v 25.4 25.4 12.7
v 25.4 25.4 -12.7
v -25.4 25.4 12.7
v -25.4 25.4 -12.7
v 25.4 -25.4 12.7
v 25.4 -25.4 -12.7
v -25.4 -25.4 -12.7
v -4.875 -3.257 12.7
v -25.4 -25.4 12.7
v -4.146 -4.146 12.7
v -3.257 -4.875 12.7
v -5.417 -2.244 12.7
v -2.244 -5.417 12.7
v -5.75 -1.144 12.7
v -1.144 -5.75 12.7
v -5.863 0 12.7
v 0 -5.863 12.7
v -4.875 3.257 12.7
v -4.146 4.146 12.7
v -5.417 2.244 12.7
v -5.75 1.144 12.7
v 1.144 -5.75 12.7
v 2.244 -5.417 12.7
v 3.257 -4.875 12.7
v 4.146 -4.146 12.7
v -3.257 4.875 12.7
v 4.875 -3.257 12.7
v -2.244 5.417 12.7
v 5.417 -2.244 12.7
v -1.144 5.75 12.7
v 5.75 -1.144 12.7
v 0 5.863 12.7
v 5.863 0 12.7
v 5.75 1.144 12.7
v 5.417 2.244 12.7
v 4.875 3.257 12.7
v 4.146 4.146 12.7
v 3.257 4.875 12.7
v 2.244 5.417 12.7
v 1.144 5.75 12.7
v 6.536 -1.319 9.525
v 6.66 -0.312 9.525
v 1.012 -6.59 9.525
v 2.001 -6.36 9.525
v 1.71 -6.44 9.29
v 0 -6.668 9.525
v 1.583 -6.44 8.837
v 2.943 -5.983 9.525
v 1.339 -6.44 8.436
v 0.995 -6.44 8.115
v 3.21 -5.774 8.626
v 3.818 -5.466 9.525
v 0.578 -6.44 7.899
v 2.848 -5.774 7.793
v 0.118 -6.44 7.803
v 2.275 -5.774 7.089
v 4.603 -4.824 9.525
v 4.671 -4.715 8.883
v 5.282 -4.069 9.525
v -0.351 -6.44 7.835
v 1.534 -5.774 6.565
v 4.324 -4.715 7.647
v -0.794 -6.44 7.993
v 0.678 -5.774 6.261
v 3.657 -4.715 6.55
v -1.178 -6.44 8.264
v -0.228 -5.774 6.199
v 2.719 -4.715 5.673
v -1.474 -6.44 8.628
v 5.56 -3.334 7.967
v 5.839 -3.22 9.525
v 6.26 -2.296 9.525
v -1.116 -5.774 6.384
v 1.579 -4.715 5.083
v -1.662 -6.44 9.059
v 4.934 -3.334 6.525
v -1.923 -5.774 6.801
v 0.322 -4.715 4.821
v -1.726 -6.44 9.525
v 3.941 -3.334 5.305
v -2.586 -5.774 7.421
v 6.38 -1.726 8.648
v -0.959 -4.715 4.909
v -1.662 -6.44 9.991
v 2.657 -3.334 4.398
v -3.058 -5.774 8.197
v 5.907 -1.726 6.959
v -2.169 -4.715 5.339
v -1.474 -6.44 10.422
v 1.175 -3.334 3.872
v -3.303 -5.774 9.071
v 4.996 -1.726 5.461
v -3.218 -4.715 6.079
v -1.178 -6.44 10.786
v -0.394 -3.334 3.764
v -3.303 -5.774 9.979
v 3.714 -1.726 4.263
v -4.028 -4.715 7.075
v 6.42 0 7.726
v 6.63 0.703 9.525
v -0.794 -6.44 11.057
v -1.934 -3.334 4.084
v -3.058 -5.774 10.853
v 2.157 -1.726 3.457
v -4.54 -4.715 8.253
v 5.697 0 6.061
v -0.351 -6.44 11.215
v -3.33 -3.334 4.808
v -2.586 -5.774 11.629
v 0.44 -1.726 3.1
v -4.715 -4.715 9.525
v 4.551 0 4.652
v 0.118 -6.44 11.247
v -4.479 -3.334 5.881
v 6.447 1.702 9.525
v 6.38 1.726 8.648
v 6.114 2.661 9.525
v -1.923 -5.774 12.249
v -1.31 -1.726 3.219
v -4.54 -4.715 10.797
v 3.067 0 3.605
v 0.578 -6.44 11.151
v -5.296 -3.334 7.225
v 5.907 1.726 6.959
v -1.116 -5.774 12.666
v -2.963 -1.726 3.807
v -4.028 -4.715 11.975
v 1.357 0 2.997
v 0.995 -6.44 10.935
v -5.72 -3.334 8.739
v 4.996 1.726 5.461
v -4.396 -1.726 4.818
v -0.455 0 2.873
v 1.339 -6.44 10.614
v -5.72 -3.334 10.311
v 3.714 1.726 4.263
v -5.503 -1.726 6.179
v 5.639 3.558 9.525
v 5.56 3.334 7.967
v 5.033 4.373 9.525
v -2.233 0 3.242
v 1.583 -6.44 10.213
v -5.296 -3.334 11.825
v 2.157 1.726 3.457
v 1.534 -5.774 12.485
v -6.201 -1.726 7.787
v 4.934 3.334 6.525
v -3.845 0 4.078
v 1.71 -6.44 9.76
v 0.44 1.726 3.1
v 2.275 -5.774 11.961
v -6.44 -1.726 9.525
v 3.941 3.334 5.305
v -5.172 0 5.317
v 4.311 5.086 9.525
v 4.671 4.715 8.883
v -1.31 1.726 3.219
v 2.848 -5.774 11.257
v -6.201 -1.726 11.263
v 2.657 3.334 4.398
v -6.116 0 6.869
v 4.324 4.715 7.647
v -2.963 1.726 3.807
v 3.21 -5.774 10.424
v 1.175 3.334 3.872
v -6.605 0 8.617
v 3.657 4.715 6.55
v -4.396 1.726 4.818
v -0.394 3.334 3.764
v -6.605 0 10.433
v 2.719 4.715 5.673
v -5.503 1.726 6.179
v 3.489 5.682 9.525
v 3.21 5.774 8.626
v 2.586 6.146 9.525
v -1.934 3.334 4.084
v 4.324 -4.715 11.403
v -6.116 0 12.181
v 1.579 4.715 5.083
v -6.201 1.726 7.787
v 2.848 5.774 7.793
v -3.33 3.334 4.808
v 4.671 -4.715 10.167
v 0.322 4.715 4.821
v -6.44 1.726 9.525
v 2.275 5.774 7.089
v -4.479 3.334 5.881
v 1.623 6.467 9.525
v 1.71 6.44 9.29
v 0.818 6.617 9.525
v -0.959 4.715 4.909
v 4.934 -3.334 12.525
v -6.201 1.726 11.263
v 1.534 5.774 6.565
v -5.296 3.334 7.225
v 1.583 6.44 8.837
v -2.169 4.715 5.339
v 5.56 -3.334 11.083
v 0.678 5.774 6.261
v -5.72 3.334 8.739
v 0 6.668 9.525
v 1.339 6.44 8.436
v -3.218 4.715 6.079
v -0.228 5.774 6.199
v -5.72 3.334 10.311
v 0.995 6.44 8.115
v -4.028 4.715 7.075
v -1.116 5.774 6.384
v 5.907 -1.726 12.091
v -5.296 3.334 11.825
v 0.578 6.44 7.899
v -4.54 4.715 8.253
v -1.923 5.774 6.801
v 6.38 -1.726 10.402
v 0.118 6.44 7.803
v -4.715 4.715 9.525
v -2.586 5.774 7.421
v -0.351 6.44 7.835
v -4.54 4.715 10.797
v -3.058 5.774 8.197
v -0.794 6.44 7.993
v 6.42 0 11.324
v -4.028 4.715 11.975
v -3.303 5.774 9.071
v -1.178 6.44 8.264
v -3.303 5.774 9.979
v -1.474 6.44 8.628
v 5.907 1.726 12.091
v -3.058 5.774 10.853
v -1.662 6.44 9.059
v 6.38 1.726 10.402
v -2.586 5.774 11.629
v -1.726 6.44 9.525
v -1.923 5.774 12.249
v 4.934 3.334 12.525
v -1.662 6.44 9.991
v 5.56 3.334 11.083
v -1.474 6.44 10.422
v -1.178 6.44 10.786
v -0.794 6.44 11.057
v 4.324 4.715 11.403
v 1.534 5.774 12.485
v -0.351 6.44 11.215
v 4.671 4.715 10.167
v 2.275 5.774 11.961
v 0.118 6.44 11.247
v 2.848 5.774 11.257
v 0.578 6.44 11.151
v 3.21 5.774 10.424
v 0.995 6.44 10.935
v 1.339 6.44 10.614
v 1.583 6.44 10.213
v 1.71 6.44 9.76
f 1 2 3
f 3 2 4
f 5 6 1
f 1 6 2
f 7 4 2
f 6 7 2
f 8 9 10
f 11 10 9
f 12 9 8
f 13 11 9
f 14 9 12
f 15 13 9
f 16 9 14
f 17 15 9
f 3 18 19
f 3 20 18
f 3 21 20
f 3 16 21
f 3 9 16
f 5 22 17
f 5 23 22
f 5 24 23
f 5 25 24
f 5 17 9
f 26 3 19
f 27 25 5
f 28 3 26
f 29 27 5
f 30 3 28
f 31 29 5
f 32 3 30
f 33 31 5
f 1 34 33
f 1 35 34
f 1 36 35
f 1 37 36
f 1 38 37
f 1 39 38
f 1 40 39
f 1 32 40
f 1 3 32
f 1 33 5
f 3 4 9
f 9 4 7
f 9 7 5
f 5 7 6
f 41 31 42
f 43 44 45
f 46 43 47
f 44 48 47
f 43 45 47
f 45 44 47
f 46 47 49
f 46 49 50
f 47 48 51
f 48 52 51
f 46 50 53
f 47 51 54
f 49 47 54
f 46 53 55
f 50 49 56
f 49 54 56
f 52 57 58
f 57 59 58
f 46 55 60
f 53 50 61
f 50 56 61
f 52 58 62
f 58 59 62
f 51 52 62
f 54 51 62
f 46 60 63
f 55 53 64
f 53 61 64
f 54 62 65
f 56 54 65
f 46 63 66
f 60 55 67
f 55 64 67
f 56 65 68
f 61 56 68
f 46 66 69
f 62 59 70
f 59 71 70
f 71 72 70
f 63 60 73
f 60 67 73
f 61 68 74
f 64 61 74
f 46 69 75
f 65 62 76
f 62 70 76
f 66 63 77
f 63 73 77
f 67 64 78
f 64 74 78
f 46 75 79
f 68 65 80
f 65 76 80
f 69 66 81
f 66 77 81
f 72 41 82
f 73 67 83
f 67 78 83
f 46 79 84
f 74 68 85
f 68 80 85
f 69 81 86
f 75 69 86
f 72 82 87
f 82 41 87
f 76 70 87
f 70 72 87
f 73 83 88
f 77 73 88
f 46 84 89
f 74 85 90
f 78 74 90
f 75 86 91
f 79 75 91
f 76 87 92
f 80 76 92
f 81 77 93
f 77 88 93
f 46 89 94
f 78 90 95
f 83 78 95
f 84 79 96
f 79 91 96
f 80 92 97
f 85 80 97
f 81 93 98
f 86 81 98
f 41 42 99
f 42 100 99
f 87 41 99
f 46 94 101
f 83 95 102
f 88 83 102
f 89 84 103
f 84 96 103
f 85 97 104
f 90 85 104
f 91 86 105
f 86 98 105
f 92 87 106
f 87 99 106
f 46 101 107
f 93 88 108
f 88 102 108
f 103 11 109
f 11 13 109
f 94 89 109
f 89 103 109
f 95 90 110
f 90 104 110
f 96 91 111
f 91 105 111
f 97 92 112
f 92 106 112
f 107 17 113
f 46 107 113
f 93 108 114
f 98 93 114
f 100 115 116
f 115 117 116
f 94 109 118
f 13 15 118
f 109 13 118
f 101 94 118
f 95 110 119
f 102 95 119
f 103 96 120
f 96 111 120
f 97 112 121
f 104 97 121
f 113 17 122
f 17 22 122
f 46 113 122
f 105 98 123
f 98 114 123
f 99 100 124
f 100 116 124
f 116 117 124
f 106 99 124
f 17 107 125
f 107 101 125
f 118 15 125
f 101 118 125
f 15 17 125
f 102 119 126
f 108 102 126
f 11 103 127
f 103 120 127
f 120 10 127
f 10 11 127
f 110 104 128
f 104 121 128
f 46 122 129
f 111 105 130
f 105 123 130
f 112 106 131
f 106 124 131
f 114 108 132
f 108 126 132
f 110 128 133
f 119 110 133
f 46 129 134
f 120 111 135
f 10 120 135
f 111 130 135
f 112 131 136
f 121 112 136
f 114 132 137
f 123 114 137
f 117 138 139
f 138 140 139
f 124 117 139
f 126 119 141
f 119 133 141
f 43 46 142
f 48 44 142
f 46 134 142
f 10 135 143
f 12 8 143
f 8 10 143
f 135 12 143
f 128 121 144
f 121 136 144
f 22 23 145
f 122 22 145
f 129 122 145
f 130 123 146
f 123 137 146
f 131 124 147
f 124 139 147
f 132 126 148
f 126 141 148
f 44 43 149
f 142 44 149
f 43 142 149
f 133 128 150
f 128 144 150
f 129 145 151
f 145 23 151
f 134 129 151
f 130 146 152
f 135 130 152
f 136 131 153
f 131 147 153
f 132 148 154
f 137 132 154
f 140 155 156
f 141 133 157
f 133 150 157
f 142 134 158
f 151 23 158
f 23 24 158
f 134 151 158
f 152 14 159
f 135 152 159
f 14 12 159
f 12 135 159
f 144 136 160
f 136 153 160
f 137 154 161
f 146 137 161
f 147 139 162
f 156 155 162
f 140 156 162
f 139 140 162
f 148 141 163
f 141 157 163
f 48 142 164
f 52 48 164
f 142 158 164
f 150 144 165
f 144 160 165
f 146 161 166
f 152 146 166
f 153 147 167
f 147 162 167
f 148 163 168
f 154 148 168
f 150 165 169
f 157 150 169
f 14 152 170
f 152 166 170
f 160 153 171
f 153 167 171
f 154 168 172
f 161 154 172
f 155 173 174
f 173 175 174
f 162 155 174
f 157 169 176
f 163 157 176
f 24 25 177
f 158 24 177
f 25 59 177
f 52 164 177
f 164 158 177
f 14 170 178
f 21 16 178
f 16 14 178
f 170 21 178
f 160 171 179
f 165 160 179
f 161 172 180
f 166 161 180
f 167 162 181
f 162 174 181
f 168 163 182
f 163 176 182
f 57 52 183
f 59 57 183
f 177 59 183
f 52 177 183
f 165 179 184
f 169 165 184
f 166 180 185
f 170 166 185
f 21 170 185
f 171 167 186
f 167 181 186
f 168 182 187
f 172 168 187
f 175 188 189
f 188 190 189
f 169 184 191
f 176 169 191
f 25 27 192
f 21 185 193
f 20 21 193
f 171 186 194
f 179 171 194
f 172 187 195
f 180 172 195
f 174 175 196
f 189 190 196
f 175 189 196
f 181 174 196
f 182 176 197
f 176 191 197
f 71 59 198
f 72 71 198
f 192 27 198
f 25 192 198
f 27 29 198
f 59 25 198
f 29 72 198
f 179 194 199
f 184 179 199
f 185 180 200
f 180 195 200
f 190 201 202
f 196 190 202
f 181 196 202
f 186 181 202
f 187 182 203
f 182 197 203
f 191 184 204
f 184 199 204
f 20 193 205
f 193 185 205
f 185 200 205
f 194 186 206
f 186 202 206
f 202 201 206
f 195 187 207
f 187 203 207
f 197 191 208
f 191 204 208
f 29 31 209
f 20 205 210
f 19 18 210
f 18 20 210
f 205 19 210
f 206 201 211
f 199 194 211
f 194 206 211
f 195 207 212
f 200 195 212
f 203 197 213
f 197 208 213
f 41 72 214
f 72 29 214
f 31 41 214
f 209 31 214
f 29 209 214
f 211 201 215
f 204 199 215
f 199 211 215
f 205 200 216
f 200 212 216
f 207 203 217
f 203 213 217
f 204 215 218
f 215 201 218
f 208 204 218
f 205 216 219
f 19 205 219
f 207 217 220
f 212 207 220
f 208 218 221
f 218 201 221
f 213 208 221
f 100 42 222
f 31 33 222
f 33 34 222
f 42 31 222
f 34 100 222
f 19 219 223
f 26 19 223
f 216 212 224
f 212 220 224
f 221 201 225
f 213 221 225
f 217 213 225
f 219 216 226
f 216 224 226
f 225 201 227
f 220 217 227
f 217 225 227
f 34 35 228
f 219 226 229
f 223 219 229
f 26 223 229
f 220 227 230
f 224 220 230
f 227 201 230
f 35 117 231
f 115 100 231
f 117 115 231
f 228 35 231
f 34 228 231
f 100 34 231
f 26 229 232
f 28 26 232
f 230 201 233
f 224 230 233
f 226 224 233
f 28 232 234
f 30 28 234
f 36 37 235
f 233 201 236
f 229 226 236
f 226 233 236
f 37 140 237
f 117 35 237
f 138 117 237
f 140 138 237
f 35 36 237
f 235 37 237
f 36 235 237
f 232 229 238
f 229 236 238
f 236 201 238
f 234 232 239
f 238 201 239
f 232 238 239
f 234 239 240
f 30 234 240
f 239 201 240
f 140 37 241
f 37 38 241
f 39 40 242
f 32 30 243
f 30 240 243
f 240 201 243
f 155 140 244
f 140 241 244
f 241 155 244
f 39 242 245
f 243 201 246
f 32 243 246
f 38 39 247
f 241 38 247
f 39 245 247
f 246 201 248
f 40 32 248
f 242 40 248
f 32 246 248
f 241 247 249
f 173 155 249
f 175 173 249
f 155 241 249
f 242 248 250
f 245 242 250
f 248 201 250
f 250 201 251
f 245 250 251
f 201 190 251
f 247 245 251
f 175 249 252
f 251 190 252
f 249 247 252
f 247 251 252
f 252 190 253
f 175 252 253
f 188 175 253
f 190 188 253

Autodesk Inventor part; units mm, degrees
ref_plane "YZ Plane" through (0, 0, 0) normal (1, 0, 0) x (0, 1, 0)
ref_plane "XZ Plane" through (0, 0, 0) normal (0, 1, 0) x (-1, 0, 0)
ref_plane "XY Plane" through (0, 0, 0) normal (0, 0, 1) x (1, 0, 0)
sketch "Sketch1" plane through (0, 0, 0) normal (0, 0, 1) x (1, 0, 0)
  line L0 (-25.4, -25.4) -> (25.4, -25.4)
  line L1 (25.4, -25.4) -> (25.4, 25.4)
  line L2 (25.4, 25.4) -> (-25.4, 25.4)
  line L3 (-25.4, 25.4) -> (-25.4, -25.4)
  line L4 (-25.4, -25.4) -> (25.4, 25.4) construction
  line L5 (25.4, -25.4) -> (-25.4, 25.4) construction
  point P0 (0, 0)
  dimension "d0" = 50.8
extrude "Extrusion1" add sketch "Sketch1" along normal mid plane 25.4
ref_plane "Work Plane1" through (0, 0, 9.525) normal (0, 0, 1) x (1, 0, 0)
sketch "Sketch2" plane through (0, 0, 9.525) normal (0, 0, 1) x (1, 0, 0)
  arc A0 (0, -6.6675) -> (0, 6.6675) centre (0, 0) ccw
  line L0 (0, -6.6675) -> (0, 6.6675)
  dimension "d5" = 6.6675
revolve "Revolution1" cut sketch "Sketch2" angle 360 about axis through (0, -6.6675, 9.525) along (0, 1, 0)
equation "\"d0\" = sideLength"
equation "\"d1\" = partDepth"
equation "\"d5\" = radiusofBallHole"
equation "\"d3\" = -workPlaneForBallDistanceFfromFontEdge"
equation "\"radiusofBallHole\" = 0.5 * diameterOfBallHole"
equation "\"sideLength\" = 50.8"
equation "\"partDepth\" = 25.4"
equation "\"workPlaneForBallDistanceFfromFontEdge\" = 3.175"
equation "\"allowancForBallToRotate\" = 0.635"
equation "\"diameterOfBallHole\" = 13.335"
properties part number "socket"
